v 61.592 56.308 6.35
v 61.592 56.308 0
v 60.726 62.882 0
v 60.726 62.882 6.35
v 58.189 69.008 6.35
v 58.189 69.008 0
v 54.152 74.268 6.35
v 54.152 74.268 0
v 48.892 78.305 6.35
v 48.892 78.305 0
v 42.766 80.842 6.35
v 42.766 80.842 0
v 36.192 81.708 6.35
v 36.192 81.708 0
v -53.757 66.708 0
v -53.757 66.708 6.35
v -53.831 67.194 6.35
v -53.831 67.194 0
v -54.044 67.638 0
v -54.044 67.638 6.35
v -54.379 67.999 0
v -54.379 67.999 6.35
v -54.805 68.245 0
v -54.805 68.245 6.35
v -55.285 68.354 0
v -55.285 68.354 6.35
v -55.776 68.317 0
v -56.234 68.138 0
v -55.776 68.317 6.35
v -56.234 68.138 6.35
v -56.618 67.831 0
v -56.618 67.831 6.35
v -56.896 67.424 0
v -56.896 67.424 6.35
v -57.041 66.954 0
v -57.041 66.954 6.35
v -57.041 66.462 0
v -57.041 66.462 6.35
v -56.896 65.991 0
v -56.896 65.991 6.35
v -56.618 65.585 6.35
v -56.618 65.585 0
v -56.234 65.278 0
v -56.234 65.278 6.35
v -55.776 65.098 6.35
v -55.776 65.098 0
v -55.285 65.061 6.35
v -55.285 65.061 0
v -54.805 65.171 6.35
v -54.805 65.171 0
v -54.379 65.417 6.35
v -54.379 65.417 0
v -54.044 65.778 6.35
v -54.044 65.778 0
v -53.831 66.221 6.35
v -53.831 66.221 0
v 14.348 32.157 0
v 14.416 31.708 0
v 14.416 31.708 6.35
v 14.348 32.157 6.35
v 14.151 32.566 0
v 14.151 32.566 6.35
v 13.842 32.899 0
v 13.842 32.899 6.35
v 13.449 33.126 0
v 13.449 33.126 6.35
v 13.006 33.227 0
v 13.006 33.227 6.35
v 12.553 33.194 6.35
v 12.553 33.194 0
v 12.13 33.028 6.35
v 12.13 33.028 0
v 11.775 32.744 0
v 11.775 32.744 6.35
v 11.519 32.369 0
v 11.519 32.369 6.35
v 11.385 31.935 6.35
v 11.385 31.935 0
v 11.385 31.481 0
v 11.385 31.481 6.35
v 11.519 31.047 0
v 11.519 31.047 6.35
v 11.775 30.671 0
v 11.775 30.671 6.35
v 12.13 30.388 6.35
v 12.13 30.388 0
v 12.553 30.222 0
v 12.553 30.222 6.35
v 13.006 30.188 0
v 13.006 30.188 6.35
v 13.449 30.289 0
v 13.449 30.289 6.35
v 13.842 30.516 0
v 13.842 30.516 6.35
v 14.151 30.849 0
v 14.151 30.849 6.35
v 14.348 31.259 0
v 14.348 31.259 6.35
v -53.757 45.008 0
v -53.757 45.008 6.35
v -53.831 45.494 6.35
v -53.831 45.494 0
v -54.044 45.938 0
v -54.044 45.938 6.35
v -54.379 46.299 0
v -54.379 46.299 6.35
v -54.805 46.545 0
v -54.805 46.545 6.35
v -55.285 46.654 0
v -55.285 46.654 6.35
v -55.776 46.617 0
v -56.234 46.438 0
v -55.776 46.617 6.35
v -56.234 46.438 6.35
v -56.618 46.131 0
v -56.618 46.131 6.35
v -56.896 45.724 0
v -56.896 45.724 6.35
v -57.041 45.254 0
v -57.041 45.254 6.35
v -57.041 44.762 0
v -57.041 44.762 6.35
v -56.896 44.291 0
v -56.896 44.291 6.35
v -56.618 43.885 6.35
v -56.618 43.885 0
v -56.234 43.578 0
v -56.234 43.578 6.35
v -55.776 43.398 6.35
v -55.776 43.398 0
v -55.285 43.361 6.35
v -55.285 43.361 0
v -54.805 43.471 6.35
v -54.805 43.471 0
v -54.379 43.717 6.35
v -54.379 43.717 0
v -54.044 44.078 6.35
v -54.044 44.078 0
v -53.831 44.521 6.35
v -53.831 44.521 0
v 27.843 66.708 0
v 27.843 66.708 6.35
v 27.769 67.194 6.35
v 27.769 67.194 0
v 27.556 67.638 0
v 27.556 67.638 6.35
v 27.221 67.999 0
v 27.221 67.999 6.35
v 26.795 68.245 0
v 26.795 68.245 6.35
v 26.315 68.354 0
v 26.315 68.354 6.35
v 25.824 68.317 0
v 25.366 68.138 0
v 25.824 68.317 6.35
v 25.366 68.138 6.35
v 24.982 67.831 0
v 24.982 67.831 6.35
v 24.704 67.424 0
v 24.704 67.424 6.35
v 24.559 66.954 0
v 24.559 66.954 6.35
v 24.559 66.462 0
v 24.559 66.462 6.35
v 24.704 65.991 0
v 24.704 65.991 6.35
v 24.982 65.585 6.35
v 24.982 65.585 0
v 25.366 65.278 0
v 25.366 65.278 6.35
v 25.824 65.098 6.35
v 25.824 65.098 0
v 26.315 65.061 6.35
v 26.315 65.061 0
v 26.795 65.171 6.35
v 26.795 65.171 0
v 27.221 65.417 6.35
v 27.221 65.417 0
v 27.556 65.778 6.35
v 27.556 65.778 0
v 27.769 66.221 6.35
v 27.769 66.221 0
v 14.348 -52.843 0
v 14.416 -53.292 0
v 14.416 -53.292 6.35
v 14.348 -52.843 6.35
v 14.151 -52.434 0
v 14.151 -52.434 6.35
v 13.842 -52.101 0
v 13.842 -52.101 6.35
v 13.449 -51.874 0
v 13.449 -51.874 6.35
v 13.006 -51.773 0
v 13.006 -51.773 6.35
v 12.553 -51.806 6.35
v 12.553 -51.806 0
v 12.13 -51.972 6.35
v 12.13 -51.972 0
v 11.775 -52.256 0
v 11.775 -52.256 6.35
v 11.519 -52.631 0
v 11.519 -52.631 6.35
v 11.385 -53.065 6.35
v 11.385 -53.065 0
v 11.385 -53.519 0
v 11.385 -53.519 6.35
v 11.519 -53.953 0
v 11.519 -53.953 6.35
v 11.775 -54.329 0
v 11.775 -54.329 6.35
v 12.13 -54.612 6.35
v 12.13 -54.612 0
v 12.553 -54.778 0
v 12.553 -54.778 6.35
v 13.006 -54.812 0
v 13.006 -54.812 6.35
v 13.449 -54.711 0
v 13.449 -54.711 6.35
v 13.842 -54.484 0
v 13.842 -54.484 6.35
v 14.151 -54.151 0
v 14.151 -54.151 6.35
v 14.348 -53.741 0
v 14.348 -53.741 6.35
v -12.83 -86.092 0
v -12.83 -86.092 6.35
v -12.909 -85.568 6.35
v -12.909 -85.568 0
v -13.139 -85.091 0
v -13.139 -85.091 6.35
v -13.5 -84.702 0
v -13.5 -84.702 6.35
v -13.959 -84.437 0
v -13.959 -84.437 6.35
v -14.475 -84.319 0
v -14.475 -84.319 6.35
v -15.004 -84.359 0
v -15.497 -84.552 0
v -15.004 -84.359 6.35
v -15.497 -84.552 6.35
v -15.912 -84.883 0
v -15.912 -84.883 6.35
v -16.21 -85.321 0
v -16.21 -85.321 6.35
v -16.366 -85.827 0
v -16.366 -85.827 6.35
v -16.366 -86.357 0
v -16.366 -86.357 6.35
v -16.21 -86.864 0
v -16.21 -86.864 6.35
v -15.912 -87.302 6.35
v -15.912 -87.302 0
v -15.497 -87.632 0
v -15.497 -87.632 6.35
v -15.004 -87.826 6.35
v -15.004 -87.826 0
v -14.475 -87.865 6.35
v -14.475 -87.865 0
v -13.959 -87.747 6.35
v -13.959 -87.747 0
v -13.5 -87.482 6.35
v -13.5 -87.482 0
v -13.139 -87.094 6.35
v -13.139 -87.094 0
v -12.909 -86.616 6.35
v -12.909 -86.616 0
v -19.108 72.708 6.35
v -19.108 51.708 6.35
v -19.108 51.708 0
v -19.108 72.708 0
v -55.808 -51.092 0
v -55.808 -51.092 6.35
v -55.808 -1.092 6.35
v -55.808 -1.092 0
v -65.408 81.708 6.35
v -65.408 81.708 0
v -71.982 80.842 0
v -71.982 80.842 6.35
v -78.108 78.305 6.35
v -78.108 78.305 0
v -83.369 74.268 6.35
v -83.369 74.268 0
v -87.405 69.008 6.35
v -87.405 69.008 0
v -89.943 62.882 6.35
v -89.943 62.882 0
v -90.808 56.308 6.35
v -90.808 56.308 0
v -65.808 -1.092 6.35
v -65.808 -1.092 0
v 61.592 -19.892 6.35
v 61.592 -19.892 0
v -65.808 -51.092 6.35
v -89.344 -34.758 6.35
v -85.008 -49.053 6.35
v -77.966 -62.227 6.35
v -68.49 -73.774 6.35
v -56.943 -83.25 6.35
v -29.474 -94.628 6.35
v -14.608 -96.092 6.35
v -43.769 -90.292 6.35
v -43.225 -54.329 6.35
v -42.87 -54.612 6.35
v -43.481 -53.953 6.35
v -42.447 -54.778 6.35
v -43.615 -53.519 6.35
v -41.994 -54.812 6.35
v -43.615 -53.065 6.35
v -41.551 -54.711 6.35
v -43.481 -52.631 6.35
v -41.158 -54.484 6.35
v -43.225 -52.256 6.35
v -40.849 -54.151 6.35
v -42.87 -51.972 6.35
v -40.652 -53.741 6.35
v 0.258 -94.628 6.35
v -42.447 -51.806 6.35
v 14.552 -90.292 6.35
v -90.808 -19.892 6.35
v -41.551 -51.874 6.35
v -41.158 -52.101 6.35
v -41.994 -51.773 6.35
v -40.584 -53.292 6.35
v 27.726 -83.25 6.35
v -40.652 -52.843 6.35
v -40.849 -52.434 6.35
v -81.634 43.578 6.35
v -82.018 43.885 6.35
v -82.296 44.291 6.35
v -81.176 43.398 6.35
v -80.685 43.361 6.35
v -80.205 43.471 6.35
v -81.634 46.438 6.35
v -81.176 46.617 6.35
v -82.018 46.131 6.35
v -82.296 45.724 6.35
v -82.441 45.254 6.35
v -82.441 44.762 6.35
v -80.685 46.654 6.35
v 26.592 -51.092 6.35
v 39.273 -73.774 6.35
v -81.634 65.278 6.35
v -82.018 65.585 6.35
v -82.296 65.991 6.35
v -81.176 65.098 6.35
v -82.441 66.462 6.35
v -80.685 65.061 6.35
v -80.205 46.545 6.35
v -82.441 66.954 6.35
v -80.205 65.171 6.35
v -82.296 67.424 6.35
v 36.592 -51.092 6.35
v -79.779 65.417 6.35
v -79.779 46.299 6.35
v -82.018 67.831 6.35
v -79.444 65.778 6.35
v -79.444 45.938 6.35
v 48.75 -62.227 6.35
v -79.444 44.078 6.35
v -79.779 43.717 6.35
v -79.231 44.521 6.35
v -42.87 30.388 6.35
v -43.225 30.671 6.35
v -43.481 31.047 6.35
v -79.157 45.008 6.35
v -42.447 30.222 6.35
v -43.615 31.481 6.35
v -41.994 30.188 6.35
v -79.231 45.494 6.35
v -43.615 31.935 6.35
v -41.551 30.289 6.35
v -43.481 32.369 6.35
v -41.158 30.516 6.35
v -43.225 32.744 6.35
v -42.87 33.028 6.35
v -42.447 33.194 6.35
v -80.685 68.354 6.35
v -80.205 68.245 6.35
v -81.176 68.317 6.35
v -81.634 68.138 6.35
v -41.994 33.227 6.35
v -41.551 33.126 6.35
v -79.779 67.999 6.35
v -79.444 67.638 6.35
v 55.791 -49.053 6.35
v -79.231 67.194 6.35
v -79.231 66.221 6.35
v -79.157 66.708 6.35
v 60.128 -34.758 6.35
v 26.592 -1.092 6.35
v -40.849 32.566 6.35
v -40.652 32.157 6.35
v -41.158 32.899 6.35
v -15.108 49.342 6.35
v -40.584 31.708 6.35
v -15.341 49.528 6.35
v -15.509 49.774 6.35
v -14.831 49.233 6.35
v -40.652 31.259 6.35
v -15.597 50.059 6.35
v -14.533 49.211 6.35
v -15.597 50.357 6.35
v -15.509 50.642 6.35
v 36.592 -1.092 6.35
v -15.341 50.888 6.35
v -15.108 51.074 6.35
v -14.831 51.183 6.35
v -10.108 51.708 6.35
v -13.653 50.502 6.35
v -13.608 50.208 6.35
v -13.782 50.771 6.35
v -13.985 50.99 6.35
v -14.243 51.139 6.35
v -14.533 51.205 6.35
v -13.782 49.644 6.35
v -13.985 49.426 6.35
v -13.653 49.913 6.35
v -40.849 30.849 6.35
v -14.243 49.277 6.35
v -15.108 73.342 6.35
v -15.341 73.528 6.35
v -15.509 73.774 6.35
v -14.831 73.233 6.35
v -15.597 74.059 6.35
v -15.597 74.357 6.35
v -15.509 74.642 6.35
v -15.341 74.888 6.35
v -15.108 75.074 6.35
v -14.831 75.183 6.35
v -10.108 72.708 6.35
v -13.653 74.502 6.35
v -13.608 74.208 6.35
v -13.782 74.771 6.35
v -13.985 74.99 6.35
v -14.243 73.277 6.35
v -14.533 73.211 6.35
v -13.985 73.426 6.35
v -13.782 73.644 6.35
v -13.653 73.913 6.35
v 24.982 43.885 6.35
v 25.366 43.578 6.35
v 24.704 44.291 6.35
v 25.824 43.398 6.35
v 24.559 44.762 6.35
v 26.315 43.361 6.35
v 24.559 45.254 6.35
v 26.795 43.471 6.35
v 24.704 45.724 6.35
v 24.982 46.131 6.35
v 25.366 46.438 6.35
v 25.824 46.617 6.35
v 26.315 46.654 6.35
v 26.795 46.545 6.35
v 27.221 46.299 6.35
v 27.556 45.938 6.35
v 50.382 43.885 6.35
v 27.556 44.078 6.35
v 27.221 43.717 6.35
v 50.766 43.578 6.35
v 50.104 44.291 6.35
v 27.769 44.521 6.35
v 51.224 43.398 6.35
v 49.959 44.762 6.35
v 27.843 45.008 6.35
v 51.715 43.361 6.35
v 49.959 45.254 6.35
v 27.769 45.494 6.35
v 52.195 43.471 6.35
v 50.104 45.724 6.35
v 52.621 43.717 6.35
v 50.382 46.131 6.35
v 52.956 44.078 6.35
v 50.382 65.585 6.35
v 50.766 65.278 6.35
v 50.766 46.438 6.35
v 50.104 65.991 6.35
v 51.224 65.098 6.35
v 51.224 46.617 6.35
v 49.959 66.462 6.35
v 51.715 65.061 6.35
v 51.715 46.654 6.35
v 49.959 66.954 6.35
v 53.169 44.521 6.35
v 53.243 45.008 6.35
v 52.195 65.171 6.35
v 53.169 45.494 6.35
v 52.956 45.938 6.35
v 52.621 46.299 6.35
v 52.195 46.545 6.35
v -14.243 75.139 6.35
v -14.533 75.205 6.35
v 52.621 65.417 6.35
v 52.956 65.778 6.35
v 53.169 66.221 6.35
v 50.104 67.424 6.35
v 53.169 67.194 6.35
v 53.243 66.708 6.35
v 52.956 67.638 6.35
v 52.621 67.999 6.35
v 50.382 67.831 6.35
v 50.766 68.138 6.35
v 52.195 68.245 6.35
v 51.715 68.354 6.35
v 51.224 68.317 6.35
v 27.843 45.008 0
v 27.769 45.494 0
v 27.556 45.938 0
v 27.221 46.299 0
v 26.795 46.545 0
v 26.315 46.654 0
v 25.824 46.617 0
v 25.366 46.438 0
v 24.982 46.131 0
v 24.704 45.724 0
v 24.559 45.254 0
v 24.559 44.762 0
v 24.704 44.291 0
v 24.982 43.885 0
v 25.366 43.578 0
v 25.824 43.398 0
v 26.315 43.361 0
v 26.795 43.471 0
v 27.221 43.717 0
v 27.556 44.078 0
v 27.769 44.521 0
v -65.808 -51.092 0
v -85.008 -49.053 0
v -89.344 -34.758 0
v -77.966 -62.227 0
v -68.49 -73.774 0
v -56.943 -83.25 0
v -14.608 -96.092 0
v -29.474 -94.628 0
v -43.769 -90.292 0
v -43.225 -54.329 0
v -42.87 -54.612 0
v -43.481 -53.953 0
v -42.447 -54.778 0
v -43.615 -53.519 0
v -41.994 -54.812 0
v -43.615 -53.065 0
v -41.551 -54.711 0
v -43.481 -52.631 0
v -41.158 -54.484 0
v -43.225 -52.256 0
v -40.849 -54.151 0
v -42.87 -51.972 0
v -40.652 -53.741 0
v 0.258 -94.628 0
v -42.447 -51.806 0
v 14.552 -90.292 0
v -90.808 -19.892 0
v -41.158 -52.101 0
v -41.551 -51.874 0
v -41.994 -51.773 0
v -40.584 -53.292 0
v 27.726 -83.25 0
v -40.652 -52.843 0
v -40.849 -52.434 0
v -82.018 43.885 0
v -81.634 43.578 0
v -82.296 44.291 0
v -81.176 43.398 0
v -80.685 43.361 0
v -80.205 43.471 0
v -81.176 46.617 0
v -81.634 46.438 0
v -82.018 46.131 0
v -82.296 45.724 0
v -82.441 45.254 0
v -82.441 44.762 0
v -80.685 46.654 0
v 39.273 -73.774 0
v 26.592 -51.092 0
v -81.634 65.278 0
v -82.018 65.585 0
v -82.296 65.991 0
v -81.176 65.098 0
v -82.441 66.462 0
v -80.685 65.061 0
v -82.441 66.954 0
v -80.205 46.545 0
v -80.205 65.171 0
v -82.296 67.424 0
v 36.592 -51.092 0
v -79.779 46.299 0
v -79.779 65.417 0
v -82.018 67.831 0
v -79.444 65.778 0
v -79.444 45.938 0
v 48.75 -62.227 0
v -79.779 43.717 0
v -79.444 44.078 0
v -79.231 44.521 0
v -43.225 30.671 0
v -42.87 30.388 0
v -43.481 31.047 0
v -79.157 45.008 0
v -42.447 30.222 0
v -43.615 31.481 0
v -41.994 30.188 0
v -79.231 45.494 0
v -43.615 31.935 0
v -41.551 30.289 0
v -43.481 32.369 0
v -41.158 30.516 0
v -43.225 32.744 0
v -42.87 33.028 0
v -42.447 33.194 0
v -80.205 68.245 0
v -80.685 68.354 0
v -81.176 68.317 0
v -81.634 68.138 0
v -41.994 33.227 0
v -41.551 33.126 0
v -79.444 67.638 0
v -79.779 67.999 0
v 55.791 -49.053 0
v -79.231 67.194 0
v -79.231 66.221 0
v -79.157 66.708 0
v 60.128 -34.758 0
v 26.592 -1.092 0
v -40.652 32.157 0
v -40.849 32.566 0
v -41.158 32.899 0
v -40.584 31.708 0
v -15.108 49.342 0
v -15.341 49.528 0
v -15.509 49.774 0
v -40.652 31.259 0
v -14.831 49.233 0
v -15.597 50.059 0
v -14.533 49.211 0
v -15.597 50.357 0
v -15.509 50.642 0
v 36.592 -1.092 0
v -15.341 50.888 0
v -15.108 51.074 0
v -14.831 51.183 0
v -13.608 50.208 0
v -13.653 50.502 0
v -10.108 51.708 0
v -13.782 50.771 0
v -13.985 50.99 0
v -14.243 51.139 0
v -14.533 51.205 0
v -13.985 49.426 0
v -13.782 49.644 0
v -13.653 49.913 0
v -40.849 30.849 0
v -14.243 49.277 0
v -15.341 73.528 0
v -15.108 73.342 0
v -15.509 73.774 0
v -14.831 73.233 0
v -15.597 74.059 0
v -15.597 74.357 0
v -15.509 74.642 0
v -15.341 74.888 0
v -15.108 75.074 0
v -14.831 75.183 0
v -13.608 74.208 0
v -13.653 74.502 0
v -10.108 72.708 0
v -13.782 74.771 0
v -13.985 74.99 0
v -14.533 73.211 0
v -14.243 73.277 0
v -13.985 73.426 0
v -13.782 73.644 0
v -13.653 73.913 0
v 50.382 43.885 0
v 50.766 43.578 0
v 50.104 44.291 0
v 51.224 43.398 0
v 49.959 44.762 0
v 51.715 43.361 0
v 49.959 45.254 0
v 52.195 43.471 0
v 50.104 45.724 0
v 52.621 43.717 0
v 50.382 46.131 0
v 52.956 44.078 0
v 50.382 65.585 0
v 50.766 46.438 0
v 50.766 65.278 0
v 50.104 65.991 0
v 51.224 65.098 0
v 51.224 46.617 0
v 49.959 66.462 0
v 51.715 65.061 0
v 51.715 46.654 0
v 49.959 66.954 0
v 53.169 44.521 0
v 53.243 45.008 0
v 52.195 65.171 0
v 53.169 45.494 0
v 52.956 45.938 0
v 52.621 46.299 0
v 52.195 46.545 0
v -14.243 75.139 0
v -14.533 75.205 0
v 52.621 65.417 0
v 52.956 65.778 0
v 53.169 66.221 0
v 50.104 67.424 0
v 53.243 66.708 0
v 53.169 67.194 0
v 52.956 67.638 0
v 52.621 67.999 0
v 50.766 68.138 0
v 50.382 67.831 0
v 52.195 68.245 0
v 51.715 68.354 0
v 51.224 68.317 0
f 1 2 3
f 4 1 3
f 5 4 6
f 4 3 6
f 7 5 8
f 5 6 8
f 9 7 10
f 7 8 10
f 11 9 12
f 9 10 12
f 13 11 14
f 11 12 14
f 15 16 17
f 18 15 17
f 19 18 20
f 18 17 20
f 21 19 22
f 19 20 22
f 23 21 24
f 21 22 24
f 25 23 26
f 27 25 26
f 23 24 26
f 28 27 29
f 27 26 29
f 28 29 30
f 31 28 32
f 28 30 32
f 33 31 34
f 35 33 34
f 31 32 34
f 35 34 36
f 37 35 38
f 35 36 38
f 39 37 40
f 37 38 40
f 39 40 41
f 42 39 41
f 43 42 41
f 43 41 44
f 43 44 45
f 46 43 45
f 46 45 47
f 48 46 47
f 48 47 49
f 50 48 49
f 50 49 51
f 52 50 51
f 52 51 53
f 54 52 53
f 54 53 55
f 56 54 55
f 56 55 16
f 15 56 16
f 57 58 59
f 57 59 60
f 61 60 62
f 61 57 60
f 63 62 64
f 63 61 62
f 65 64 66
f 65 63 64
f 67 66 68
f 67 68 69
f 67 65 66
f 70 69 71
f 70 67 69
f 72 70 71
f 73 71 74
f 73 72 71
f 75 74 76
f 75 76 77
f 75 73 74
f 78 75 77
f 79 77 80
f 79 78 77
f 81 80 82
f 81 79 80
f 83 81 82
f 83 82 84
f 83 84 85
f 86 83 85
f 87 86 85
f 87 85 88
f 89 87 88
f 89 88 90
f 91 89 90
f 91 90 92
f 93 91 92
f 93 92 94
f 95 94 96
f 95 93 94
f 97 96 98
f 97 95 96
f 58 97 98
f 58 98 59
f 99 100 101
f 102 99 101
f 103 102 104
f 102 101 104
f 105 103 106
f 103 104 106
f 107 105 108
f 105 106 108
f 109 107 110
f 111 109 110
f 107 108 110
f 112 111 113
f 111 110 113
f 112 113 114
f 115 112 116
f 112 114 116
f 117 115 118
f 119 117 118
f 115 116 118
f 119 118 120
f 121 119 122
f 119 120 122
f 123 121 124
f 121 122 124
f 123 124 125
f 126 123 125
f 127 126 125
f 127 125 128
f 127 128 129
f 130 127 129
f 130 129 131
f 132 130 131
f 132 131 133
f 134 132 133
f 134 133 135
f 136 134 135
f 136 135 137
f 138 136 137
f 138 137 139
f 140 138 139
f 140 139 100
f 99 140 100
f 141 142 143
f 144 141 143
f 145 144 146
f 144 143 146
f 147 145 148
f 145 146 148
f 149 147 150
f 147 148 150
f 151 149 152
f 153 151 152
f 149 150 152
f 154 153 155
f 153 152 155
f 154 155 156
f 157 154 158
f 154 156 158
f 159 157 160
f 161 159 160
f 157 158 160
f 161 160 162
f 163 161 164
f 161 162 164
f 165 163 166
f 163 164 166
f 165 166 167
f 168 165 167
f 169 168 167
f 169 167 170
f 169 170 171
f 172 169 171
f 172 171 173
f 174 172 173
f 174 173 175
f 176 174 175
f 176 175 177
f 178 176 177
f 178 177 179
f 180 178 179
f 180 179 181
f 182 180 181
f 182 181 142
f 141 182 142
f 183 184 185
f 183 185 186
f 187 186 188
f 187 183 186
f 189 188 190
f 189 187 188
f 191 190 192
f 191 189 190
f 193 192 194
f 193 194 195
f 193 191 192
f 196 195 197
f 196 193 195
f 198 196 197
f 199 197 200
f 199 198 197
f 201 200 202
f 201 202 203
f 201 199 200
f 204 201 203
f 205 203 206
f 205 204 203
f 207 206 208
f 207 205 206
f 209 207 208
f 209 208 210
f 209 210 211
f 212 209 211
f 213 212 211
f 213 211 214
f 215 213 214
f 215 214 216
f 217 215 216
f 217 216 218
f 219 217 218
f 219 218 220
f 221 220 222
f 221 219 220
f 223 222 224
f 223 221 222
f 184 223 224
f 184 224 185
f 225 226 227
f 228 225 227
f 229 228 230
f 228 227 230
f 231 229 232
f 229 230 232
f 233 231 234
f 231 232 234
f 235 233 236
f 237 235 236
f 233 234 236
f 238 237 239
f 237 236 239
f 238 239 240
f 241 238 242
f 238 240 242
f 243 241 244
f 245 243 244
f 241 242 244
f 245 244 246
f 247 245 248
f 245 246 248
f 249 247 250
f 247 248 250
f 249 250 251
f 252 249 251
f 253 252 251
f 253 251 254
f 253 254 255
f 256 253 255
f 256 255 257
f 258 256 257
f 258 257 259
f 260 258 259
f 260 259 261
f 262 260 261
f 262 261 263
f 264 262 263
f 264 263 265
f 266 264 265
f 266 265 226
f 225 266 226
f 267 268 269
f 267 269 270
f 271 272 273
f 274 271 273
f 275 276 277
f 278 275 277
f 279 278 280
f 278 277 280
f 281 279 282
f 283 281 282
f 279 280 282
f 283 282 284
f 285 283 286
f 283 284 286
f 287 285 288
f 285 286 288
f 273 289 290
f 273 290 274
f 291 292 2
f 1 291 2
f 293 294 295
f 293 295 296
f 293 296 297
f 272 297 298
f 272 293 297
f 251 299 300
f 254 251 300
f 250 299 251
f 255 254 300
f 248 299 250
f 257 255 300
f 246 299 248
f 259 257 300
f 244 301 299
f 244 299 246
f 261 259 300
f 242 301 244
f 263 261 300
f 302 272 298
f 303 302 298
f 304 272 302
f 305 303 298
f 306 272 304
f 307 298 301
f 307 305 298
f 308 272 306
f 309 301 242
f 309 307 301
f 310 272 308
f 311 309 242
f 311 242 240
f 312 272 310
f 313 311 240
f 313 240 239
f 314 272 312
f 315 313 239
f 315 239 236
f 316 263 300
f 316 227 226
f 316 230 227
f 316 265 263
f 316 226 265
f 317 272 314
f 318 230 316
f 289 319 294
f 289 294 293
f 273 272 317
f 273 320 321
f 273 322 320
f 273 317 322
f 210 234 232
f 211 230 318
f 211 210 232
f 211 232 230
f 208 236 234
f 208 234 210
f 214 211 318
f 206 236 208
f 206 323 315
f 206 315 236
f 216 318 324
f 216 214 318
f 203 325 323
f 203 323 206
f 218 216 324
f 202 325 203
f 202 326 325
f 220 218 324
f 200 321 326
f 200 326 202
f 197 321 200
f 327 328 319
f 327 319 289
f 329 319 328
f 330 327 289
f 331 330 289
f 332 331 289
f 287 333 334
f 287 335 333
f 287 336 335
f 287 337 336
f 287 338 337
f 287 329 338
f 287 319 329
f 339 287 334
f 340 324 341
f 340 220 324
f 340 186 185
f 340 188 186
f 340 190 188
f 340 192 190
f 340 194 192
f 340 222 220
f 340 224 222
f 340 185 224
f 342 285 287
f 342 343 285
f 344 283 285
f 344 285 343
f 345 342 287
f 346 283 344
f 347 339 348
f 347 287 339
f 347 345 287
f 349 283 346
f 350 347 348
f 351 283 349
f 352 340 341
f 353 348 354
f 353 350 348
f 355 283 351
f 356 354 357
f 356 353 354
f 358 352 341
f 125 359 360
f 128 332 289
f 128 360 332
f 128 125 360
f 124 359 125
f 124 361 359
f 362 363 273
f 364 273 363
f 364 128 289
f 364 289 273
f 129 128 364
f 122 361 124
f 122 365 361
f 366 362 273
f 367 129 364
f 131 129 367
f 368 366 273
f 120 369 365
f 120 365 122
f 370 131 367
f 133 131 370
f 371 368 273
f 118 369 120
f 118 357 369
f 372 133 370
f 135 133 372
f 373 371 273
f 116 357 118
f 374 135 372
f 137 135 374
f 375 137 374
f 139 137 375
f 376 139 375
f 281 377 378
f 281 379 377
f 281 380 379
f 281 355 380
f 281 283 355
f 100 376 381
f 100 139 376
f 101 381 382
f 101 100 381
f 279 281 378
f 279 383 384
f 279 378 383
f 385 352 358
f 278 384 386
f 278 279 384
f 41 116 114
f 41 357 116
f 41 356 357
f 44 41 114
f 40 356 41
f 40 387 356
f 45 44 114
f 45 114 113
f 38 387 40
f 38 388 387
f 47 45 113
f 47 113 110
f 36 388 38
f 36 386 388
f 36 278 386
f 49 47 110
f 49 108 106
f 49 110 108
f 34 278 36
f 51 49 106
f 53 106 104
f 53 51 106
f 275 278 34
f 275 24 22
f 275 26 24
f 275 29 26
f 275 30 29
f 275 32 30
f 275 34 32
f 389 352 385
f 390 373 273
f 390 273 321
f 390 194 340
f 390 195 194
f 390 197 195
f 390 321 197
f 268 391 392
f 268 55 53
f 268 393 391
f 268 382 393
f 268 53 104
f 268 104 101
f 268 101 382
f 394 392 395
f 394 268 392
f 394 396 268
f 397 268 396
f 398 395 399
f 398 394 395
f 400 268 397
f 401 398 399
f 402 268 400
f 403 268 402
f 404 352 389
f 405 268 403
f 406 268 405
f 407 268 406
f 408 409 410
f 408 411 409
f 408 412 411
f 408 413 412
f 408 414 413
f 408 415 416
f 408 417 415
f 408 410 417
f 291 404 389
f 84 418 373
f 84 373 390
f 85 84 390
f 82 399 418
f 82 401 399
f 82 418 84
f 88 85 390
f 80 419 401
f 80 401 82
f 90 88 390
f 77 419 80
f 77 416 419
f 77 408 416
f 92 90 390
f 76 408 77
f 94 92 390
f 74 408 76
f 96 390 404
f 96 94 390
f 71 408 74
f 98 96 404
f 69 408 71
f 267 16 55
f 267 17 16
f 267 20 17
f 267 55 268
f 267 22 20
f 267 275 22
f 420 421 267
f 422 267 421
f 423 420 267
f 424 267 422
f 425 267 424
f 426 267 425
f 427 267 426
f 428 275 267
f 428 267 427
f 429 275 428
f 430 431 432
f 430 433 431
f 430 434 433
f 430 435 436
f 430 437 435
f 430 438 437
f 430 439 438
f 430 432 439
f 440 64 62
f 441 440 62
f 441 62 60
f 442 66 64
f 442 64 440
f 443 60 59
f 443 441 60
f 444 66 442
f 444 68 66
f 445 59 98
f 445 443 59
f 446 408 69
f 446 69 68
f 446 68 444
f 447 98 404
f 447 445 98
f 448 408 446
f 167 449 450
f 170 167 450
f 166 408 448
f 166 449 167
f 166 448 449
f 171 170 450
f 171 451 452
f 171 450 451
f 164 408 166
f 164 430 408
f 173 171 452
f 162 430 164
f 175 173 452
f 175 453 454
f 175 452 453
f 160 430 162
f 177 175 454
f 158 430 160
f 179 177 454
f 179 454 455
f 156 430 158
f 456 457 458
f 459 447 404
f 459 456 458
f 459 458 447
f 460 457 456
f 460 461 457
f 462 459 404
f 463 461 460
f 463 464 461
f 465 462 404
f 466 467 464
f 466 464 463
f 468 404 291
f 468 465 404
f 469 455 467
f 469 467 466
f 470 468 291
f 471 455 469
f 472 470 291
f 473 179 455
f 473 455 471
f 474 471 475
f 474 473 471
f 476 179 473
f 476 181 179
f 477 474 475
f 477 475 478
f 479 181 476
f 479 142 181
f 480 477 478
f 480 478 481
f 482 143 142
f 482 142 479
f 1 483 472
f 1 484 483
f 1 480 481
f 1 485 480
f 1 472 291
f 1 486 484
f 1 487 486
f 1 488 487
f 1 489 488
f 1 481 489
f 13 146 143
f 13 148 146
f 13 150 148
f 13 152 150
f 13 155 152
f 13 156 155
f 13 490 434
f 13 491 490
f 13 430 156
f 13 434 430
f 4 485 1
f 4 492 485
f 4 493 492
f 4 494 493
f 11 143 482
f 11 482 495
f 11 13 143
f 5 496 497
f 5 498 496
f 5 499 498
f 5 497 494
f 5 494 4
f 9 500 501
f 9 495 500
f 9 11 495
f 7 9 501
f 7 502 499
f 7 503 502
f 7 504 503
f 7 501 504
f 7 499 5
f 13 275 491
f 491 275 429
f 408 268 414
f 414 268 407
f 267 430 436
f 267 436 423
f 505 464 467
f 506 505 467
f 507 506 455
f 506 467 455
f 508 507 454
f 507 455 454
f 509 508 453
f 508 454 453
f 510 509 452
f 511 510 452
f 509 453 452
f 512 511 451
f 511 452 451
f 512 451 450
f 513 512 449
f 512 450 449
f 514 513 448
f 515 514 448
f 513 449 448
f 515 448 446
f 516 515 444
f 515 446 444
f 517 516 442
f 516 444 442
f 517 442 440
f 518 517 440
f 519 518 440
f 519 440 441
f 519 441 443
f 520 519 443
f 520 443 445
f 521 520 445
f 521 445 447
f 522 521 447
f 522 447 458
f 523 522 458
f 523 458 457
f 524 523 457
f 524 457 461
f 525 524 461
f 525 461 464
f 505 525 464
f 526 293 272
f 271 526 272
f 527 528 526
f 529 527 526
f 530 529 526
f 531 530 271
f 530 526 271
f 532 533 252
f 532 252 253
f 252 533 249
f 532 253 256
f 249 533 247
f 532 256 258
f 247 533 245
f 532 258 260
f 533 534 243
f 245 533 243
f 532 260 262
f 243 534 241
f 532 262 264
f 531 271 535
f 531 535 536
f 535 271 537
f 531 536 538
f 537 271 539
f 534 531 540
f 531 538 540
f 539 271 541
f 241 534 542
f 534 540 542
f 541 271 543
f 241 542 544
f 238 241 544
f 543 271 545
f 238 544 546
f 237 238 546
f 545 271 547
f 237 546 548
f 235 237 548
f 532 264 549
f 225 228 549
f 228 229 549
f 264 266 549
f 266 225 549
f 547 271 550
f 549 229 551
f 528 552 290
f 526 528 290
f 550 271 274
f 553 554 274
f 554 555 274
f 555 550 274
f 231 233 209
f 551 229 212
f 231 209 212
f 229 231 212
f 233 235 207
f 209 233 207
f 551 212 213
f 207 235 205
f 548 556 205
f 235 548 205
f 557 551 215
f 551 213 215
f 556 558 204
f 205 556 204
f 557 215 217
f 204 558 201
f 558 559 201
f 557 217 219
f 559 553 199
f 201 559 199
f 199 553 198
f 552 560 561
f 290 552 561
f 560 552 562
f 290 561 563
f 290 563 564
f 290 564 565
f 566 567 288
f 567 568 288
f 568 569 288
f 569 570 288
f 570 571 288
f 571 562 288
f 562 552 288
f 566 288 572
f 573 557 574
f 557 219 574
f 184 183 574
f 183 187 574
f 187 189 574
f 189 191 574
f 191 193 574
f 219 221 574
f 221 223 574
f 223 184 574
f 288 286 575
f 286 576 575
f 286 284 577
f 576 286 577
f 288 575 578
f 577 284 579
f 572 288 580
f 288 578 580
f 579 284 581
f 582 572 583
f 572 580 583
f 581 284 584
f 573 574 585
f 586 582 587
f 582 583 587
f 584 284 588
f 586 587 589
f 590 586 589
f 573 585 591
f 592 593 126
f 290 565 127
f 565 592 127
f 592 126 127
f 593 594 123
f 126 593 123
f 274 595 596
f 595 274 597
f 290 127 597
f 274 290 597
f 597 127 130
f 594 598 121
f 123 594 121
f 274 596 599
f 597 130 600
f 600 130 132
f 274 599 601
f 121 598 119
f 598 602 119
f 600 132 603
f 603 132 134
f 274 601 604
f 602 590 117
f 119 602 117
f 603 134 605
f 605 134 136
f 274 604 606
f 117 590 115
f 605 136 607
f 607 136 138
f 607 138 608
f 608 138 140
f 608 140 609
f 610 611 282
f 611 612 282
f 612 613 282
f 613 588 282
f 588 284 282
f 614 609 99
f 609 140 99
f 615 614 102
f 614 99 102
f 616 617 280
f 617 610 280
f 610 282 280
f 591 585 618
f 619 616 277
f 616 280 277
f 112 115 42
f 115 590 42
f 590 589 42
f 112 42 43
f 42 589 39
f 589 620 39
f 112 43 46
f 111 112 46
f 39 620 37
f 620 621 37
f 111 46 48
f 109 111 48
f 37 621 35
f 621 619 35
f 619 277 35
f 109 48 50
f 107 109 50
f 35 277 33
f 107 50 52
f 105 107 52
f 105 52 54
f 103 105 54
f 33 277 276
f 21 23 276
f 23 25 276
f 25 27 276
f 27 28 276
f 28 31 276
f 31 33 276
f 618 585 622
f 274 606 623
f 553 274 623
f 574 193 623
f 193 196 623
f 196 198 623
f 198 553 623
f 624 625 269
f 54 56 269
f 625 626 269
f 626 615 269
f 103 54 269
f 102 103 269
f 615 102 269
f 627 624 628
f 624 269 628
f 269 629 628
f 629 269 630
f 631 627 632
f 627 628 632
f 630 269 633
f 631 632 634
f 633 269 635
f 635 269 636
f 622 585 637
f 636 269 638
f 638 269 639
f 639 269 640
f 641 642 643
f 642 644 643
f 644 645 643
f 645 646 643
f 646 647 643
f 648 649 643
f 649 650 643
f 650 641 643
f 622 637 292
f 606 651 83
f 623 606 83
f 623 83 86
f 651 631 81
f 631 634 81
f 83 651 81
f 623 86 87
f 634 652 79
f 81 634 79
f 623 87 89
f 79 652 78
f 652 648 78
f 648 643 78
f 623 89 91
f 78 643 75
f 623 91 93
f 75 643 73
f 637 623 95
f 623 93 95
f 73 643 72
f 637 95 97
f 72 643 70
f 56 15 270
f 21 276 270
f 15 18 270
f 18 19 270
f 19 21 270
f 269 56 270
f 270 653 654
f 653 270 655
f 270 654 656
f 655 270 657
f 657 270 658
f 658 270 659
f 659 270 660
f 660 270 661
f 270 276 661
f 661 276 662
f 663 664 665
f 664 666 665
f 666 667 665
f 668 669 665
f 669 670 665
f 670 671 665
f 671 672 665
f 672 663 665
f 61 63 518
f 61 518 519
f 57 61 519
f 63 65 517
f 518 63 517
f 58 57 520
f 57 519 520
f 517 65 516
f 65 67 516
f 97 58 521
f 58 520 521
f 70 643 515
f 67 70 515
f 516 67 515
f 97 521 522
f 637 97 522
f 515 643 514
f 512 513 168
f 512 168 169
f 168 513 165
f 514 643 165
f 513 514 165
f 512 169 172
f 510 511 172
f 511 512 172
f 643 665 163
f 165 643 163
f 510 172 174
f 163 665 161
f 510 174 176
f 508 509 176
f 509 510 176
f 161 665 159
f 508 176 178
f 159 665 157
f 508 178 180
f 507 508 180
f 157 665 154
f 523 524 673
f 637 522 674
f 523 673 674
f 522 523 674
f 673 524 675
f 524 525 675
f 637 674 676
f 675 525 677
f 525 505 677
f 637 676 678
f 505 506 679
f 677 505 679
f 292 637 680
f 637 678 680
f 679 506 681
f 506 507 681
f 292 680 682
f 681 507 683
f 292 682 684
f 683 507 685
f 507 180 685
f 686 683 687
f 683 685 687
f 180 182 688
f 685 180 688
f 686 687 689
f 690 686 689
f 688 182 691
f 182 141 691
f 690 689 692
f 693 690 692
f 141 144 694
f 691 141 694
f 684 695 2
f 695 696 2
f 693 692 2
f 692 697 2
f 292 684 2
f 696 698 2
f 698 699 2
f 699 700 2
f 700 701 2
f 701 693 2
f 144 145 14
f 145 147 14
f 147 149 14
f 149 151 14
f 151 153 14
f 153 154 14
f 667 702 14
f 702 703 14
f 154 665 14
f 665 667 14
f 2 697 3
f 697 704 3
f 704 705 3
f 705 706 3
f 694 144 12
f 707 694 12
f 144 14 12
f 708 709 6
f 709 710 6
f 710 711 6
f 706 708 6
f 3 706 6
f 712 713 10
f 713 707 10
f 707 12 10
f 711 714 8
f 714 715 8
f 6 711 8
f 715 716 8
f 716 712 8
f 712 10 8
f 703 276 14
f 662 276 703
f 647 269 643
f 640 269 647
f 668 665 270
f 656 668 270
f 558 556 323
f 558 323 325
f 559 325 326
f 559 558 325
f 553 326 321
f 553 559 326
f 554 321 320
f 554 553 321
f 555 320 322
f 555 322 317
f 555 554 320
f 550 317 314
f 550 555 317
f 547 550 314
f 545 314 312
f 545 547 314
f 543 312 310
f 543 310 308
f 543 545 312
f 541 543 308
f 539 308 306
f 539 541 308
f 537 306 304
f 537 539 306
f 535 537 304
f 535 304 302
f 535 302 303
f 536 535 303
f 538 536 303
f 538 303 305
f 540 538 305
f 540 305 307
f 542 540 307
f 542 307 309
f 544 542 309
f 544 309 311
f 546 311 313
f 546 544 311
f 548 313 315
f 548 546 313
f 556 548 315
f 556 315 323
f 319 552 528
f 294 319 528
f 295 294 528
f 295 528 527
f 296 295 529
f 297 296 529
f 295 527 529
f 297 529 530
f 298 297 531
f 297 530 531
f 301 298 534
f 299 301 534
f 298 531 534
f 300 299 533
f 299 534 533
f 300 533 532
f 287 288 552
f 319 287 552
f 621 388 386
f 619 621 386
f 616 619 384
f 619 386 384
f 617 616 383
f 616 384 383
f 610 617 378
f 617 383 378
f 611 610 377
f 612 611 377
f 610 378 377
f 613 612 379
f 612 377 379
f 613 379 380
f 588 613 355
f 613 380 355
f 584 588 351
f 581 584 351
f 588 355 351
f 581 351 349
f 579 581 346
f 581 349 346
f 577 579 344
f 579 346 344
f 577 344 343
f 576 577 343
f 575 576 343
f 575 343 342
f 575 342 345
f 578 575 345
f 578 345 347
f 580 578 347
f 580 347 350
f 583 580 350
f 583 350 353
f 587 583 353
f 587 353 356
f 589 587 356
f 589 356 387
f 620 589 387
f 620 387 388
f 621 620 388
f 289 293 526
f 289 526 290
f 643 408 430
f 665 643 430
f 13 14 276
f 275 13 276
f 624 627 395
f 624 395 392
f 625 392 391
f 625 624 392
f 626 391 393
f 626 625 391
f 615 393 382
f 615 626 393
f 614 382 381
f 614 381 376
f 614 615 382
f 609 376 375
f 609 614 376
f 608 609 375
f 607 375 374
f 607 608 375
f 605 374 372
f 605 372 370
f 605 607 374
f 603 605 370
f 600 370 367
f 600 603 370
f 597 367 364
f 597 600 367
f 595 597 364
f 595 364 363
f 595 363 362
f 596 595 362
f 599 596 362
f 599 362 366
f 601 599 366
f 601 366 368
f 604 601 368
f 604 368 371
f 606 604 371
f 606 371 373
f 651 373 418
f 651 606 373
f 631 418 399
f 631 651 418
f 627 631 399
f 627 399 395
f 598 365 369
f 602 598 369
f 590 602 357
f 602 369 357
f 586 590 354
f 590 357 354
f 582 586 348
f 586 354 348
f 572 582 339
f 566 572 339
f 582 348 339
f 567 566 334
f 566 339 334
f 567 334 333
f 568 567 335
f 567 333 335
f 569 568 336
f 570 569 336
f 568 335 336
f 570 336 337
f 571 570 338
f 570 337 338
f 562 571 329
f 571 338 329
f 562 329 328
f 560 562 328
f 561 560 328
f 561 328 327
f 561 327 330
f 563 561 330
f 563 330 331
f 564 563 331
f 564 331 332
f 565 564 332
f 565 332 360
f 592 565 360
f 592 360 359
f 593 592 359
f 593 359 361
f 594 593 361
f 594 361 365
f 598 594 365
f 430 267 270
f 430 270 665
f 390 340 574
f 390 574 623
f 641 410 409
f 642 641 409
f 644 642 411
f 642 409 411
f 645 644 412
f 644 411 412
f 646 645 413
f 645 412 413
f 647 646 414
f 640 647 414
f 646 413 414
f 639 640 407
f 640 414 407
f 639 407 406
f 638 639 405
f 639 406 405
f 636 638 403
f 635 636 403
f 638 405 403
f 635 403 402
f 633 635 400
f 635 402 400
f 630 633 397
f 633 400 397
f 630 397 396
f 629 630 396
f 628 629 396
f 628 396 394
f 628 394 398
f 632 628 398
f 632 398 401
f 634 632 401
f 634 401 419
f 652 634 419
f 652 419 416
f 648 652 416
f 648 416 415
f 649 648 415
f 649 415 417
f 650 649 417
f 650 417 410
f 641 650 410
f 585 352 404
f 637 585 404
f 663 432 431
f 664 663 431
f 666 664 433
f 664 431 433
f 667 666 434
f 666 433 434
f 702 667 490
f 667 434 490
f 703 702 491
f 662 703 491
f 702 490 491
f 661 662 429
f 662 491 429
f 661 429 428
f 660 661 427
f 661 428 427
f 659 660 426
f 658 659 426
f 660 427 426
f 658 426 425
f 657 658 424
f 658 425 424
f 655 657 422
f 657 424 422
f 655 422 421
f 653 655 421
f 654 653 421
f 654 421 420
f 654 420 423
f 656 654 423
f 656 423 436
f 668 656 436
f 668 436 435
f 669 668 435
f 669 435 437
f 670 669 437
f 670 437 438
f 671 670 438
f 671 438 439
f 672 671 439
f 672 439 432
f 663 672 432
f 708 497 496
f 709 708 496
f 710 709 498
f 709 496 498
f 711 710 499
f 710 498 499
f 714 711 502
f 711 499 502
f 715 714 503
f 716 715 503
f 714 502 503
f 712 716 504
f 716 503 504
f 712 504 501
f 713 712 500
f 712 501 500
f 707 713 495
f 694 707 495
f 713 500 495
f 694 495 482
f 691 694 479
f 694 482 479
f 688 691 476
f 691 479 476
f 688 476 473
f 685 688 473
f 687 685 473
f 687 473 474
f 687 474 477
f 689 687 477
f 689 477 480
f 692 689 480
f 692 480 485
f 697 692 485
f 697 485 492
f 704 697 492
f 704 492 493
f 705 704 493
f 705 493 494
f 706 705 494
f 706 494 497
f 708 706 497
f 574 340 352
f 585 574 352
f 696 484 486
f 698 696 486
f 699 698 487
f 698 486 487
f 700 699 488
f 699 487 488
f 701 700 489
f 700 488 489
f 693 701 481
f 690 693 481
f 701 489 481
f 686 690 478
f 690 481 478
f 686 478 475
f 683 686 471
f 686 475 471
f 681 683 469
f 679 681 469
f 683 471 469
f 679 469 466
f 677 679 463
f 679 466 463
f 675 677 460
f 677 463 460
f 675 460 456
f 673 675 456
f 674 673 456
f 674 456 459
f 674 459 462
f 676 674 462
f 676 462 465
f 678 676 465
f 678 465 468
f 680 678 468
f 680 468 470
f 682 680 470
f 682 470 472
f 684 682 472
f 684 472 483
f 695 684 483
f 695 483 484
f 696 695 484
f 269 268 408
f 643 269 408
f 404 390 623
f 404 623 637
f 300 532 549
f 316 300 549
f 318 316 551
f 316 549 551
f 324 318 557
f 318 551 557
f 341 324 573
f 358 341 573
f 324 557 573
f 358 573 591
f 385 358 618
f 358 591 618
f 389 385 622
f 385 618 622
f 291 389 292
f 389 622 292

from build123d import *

# Parameters (mm, degrees)
F0_R     = 1.524
F1_DEPTH = 6.35
F2_R     = 1.651
F3_DEPTH = 6.351
F4_R     = 1.778
F5_DEPTH = 6.351
F6_W     = 10
F6_H     = 50
F6_W_2   = 9
F6_H_2   = 21
F6_R     = 1
F7_DEPTH = 6.351


with BuildPart() as f1:
    # F0 (on Top) → F1 (new body)
    with BuildSketch(Plane.XY):
        with BuildLine():
            Line((36.191804, 81.707741), (-65.408196, 81.707741))
            ThreePointArc((-65.408196, 81.707741), (-83.368708, 74.268254), (-90.808196, 56.307741))
            Line((-90.808196, 56.307741), (-90.808196, -19.892259))
            ThreePointArc((-90.808196, -19.892259), (-68.489733, -73.773795), (-14.608196, -96.092259))
            ThreePointArc((-14.608196, -96.092259), (39.273341, -73.773795), (61.591804, -19.892259))
            Line((61.591804, -19.892259), (61.591804, 56.307741))
            ThreePointArc((61.591804, 56.307741), (54.152316, 74.268254), (36.191804, 81.707741))
        make_face()
        with Locations((-42.108196, -53.292259)):
            Circle(F0_R, mode=Mode.SUBTRACT)
        with Locations((12.891804, -53.292259)):
            Circle(F0_R, mode=Mode.SUBTRACT)
        with Locations((-42.108196, 31.707741)):
            Circle(F0_R, mode=Mode.SUBTRACT)
        with Locations((12.891804, 31.707741)):
            Circle(F0_R, mode=Mode.SUBTRACT)
    extrude(amount=F1_DEPTH)

    # F2 (on face) → F3 (cut, through all)
    with BuildSketch(Plane.XY.offset(6.35)):
        with Locations((-80.808196, 66.707741)):
            Circle(F2_R)
        with Locations((-80.808196, 45.007741)):
            Circle(F2_R)
        with Locations((-55.408196, 66.707741)):
            Circle(F2_R)
        with Locations((-55.408196, 45.007741)):
            Circle(F2_R)
        with Locations((26.191804, 66.707741)):
            Circle(F2_R)
        with Locations((51.591804, 66.707741)):
            Circle(F2_R)
        with Locations((26.191804, 45.007741)):
            Circle(F2_R)
        with Locations((51.591804, 45.007741)):
            Circle(F2_R)
    extrude(amount=-F3_DEPTH, mode=Mode.SUBTRACT)

    # F4 (on face) → F5 (cut, through all)
    with BuildSketch(Plane.XY.offset(6.35)):
        with Locations((-14.608196, -86.092259)):
            Circle(F4_R)
    extrude(amount=-F5_DEPTH, mode=Mode.SUBTRACT)

    # F6 (on face) → F7 (cut, through all)
    with BuildSketch(Plane.XY.offset(6.35)):
        with Locations((-60.808196, -26.092259)):
            Rectangle(F6_W, F6_H)
        with Locations((31.591804, -26.092259)):
            Rectangle(F6_W, F6_H)
        with Locations((-14.608196, 62.207741)):
            Rectangle(F6_W_2, F6_H_2)
        with Locations((-14.608196, 74.207741)):
            Circle(F6_R)
        with Locations((-14.608196, 50.207741)):
            Circle(F6_R)
    extrude(amount=-F7_DEPTH, mode=Mode.SUBTRACT)


solid = f1.part
